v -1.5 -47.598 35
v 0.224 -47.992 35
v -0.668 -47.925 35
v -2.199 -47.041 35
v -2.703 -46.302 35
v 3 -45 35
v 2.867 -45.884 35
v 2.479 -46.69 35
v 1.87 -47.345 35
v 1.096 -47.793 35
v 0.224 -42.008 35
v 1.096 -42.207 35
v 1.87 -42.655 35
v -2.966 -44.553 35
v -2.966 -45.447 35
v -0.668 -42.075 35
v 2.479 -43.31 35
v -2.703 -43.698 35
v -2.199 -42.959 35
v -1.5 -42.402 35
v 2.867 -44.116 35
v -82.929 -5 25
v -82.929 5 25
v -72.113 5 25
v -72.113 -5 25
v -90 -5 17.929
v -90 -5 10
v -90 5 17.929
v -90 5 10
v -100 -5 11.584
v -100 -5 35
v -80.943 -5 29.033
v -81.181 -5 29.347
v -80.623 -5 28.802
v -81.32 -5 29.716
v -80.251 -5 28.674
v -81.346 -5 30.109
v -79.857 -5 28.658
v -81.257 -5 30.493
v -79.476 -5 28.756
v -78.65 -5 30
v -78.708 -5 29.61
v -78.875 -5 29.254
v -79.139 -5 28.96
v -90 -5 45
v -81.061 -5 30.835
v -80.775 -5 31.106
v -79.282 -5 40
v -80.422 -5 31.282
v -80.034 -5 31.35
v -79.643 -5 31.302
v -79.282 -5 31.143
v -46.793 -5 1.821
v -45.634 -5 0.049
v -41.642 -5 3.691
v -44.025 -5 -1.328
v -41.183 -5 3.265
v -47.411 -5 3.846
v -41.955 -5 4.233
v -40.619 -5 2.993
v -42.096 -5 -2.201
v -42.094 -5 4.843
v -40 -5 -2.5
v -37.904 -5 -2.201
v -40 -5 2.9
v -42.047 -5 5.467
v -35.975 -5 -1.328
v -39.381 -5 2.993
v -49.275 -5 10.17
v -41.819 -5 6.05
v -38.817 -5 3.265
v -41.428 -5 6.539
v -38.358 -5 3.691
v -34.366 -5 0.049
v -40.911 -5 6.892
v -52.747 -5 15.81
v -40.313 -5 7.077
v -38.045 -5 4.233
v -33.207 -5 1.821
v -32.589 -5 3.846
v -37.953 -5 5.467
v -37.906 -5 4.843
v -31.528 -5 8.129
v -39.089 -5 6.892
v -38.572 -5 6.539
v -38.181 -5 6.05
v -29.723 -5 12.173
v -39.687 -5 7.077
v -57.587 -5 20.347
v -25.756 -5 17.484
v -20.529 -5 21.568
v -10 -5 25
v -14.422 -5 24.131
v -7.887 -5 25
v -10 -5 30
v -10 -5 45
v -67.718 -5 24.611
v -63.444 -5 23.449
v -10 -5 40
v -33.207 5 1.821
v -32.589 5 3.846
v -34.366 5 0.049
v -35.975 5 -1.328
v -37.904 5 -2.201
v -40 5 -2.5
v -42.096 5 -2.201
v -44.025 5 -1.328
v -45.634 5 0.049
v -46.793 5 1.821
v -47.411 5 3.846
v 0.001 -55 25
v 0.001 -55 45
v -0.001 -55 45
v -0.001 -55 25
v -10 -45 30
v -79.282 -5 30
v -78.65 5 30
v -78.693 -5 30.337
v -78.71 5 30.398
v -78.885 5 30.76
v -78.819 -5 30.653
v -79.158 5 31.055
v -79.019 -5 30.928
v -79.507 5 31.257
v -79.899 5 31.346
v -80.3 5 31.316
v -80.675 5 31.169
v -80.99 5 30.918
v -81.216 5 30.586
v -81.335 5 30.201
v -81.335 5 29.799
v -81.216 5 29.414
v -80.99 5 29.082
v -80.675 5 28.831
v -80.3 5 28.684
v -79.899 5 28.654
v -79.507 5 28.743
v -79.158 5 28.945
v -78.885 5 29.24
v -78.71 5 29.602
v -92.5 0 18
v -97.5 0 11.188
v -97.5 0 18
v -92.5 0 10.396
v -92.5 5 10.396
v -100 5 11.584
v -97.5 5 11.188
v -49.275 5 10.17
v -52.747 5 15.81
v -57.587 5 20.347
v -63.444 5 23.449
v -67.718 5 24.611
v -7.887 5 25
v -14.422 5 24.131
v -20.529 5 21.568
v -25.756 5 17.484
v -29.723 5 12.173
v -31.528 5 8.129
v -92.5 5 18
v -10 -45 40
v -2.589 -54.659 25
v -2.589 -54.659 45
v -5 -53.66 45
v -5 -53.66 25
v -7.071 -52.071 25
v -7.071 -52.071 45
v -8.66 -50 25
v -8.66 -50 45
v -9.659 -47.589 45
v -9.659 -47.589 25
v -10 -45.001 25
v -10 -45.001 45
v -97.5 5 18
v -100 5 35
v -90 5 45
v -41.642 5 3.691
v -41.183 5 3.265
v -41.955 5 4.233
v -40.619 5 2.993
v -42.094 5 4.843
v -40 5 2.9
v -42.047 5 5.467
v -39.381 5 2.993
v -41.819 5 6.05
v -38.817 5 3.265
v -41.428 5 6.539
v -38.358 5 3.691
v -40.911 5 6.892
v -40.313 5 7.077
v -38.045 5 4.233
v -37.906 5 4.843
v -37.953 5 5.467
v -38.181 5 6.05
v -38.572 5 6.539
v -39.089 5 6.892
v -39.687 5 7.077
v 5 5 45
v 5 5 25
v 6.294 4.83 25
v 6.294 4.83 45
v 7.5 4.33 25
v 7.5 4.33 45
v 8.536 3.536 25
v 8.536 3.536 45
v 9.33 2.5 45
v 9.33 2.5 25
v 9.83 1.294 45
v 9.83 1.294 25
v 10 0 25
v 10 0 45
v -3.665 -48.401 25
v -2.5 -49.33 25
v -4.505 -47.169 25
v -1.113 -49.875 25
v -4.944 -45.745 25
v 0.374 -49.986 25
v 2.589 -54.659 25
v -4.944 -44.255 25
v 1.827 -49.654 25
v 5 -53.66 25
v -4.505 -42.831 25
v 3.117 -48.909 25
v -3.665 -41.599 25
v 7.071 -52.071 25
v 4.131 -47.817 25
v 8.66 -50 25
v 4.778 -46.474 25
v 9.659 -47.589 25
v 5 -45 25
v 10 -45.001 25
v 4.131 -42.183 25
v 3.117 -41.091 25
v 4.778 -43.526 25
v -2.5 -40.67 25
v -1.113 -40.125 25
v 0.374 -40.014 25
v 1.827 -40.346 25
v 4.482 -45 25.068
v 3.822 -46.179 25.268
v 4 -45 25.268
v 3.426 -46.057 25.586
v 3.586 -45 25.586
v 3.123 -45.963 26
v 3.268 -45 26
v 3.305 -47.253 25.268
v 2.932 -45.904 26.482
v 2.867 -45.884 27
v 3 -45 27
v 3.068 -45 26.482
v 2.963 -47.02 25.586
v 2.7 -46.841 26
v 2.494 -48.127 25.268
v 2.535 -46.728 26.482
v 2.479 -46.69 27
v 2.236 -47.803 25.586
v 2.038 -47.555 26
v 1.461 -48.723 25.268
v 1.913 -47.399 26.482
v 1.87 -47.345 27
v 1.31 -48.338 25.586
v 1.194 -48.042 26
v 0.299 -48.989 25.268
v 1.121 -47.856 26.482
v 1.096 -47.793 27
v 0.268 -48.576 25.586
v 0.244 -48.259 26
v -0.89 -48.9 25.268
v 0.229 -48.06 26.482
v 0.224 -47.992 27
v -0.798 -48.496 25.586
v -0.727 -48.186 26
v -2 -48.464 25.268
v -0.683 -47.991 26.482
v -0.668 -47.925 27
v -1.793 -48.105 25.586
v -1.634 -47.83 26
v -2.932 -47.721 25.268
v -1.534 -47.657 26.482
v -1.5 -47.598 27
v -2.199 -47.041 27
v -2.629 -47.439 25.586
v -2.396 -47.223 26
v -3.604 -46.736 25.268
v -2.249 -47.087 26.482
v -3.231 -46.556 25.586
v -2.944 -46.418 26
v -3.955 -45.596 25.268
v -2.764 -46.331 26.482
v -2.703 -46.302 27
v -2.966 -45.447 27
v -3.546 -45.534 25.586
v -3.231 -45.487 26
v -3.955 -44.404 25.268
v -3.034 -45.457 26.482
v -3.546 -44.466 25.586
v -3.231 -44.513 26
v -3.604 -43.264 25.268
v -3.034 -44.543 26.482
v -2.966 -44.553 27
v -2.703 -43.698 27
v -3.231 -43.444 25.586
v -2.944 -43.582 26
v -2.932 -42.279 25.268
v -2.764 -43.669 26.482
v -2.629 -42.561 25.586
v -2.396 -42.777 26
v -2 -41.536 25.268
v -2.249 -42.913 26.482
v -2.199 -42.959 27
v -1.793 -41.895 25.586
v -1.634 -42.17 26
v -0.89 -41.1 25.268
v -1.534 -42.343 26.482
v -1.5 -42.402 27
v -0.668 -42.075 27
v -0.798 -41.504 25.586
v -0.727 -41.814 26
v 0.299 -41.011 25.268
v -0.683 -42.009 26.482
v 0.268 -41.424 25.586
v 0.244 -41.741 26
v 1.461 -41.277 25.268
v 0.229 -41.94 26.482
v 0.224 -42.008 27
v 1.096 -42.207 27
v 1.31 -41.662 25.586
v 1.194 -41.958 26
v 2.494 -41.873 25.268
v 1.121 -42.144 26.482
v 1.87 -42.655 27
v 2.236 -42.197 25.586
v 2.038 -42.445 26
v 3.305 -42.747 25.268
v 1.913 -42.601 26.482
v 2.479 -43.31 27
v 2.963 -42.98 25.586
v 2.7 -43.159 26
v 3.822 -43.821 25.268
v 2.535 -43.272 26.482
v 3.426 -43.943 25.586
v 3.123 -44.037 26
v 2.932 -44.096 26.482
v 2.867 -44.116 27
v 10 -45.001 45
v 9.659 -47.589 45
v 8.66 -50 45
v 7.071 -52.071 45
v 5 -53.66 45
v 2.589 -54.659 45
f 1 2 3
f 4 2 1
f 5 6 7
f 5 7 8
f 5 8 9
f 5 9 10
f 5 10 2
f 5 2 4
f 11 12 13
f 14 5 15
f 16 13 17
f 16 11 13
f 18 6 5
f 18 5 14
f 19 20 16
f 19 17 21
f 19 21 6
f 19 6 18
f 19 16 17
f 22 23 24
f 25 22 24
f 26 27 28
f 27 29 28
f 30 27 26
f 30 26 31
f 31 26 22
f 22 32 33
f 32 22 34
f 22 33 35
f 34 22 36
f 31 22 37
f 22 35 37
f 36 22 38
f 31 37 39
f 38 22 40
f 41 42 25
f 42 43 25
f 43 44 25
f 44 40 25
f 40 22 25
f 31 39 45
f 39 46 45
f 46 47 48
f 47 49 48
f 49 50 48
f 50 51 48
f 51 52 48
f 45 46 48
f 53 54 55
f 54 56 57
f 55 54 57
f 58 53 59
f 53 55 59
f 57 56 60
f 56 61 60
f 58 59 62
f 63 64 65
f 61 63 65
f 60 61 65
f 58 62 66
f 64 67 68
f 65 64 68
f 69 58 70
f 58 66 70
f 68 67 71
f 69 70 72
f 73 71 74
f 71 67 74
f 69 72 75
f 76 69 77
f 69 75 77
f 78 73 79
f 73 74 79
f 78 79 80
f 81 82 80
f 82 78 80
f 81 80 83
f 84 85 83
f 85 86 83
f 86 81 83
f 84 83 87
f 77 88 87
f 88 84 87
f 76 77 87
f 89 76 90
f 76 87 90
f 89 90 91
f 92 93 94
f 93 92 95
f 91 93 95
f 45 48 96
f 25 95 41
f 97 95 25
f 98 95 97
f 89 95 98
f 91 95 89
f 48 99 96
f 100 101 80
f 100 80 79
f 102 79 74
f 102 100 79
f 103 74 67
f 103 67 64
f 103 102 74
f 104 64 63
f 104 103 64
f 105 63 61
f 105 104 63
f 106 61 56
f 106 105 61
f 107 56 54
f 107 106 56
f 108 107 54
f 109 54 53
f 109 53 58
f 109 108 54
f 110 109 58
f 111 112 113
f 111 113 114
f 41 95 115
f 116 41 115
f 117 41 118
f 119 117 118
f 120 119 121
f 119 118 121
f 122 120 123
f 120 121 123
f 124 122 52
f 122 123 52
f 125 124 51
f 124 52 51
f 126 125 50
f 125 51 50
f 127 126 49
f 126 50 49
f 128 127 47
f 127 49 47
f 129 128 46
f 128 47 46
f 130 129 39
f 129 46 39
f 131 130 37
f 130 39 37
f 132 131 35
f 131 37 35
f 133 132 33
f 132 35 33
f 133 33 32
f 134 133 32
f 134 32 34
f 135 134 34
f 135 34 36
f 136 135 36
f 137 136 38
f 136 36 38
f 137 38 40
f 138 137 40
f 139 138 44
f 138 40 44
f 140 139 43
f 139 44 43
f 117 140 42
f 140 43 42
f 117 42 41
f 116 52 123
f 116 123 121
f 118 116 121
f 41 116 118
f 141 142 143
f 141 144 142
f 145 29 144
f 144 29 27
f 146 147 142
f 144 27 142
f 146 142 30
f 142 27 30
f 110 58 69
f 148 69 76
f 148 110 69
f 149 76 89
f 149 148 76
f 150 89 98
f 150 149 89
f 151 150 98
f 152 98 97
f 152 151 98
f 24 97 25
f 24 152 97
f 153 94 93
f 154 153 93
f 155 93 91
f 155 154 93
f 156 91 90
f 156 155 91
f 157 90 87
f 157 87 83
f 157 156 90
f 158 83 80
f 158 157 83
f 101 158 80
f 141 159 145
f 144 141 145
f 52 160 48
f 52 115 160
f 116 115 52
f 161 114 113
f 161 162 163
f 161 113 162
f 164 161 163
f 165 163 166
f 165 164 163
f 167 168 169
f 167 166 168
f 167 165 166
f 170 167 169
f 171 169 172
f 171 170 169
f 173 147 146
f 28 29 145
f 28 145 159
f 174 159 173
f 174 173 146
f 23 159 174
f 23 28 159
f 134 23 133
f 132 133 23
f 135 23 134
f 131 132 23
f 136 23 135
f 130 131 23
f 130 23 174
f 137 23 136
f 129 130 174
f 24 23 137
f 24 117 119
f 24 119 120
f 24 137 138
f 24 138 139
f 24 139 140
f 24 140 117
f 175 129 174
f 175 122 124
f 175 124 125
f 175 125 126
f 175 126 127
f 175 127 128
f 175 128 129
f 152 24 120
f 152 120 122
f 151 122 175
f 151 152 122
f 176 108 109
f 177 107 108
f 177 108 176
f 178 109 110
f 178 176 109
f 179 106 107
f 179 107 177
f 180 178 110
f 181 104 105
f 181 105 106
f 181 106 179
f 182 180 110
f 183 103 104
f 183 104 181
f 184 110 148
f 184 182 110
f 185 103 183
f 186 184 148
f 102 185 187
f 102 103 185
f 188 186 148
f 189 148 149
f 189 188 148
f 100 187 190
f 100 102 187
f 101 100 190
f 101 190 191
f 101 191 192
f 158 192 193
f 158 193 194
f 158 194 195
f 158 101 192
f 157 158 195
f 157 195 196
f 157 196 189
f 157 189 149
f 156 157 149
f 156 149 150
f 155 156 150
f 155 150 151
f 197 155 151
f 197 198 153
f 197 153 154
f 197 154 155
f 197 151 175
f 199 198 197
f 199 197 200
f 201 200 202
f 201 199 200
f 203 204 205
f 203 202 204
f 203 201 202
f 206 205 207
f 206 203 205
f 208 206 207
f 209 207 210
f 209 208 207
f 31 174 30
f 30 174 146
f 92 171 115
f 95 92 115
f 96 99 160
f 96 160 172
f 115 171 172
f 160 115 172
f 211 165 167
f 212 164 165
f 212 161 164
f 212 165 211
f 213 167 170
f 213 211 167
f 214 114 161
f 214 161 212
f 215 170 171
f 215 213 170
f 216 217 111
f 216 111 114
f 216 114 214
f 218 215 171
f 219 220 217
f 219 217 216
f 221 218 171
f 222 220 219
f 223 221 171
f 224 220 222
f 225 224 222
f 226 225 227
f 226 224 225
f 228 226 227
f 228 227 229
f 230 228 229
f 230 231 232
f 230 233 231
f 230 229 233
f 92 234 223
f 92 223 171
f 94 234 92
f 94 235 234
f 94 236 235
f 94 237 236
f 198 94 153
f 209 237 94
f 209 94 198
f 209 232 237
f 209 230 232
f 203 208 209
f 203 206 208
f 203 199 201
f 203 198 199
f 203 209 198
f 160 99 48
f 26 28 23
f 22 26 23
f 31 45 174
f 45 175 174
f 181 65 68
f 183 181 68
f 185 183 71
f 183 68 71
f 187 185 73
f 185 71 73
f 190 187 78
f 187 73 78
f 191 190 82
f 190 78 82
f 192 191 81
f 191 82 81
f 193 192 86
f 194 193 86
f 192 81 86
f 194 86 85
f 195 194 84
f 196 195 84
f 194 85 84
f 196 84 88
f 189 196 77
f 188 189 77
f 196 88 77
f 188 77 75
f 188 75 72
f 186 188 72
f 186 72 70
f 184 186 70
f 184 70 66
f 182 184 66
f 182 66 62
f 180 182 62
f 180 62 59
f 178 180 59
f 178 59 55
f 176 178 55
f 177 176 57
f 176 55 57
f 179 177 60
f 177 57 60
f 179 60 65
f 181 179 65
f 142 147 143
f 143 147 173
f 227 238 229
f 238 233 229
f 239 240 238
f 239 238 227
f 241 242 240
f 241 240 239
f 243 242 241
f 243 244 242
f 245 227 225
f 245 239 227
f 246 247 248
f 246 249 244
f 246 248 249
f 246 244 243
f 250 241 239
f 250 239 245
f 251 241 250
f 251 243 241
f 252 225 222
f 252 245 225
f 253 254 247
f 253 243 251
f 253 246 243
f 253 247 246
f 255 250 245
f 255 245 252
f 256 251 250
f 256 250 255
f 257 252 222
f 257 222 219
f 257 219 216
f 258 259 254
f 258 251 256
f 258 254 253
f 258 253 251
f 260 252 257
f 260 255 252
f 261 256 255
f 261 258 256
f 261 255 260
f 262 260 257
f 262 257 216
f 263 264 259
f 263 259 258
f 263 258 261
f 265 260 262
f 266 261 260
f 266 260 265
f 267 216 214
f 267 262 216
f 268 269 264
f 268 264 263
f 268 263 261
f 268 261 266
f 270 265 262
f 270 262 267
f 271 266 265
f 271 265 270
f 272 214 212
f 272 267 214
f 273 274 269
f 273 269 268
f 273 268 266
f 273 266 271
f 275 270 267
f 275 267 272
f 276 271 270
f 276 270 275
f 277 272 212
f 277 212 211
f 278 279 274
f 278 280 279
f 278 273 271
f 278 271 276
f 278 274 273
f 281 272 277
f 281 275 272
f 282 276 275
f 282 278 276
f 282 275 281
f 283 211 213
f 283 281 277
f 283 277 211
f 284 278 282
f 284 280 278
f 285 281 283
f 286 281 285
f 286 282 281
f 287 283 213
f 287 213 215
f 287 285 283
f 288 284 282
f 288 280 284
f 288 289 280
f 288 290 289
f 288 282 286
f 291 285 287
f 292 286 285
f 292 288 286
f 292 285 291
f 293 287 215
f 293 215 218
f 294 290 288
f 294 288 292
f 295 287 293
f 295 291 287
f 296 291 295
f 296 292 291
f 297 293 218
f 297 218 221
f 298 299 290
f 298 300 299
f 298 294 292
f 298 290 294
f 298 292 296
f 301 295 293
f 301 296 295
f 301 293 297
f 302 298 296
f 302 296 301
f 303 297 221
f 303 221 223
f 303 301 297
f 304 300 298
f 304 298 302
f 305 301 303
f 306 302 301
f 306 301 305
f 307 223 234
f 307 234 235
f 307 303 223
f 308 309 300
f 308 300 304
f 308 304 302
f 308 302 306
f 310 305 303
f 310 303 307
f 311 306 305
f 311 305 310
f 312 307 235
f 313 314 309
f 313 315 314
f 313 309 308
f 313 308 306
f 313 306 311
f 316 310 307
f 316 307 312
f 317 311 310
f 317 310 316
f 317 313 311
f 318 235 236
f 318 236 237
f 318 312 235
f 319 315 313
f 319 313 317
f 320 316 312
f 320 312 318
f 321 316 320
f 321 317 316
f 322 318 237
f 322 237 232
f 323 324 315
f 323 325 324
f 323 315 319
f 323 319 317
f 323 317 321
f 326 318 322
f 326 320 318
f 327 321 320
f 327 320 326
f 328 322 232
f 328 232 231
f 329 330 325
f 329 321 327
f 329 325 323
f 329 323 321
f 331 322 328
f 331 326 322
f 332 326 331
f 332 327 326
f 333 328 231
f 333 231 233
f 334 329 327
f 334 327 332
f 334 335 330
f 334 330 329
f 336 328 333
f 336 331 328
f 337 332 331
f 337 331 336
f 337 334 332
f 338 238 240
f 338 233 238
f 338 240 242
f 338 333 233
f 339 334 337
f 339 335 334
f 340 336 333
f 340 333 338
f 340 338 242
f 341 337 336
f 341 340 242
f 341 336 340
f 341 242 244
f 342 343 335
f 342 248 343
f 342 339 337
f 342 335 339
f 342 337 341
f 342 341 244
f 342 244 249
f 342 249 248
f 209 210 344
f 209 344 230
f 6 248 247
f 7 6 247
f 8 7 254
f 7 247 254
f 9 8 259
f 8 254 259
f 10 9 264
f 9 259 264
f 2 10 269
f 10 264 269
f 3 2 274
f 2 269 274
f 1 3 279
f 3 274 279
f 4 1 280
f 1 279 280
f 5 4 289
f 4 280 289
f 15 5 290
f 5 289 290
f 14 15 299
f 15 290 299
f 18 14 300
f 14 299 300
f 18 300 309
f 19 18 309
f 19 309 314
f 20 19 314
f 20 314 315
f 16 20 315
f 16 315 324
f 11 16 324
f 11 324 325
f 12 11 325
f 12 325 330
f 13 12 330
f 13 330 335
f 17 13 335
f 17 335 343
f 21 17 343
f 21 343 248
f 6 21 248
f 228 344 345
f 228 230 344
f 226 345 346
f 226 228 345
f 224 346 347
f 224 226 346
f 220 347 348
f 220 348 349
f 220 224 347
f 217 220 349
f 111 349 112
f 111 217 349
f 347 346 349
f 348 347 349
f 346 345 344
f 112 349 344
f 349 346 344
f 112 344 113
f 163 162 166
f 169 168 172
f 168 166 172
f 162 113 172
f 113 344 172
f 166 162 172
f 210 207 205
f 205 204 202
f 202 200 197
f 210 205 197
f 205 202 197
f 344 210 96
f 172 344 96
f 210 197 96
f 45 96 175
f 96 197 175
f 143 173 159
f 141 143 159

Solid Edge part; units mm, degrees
sketch "Sketch1" plane through (0, 0, 0) normal (0, -1, 0) x (1, 0, 0)
  line L0 (10, 45) -> (10, 25)
  line L1 (-32.5, 25) -> (10, 25)
  line L2 (-32.5, 5) -> (-32.5, 25)
  arc A0 (-32.5, 5) -> (-47.5, 5) centre (-40, 5) cw
  line L3 (-47.5, 25) -> (-47.5, 5)
  line L4 (-82.9289, 25) -> (-47.5, 25)
  line L5 (-90, 17.9289) -> (-82.9289, 25)
  line L6 (-90, 10) -> (-90, 17.9289)
  line L7 (-100, 10) -> (-90, 10)
  line L8 (-100, 35) -> (-100, 10)
  line L9 (-90, 45) -> (-100, 35)
  line L10 (10, 45) -> (-90, 45)
  dimension "D1" = 10
  dimension "D2" = 10
  dimension "D3" = 10
  dimension "D4" = 100
  dimension "D5" = 15
  dimension "D6" = 5
  dimension "D7" = 10
  dimension "D8" = 10
  dimension "D9" = 40
extrude "Protrusion1" add sketch "Sketch1" along normal mid plane 10
sketch "Sketch2" plane through (0, 0, 0) normal (0, -1, 0) x (1, 0, 0)
  circle A0 centre (-80, 30) radius 1.35
  dimension "D1" = 30
  dimension "D2" = 80
extrude "ExtrudedCutout_3" cut sketch "Sketch2" along normal mid plane 29.2691
hole "Hole_1" at (-40, -5, 5) direction (0, 1, 0) diameter 4.2 end up to next
fillet "Round_7" radius 25 2 edges at (-47.5, 0, 25) (-32.5, 0, 25)
sketch "Sketch3" plane through (10, 0, 30) normal (1, 0, 0) x (0, 1, 0)
  line L0 (5, 15) -> (-55, 15)
  line L1 (-55, 15) -> (-55, -5)
  line L2 (-55, -5) -> (5, -5)
  line L3 (5, -5) -> (5, 15)
  dimension "D1" = 60
extrude "ExtrudedProtrusion_3" add sketch "Sketch3" against normal blind 20
fillet "Round_8" radius 10 2 edges at (-10, -55, 35) (10, -55, 35)
fillet "Round_9" radius 5 1 edges at (10, 5, 35)
sketch "Sketch4" plane through (-50, 5, 17.5) normal (0, 1, 0) x (1, 0, 0)
  line L0 (-47.5, 7.5) -> (-47.5, -0.5)
  line L1 (-47.5, -0.5) -> (-42.5, -0.5)
  line L2 (-42.5, -0.5) -> (-42.5, 7.5)
  line L3 (-42.5, 7.5) -> (-47.5, 7.5)
  dimension "D1" = 5
  dimension "D2" = 8
extrude "ExtrudedCutout_5" cut sketch "Sketch4" against normal blind 5
sketch "Sketch5" plane through (-65, -5, 17.5) normal (0, -1, 0) x (1, 0, 0)
  line L0 (-25, -7.5) -> (-35, -5.9162)
  line L1 (-35, -5.9162) -> (-35, -7.5)
  line L2 (-35, -7.5) -> (-25, -7.5)
extrude "ExtrudedCutout_6" cut sketch "Sketch5" against normal blind 31.7921
sketch "Sketch6" plane through (-8.75, -25, 25) normal (0, 0, -1) x (1, 0, 0)
  circle A0 centre (8.75, 20) radius 3
  dimension "D1" = 6
extrude "ExtrudedCutout_7" cut sketch "Sketch6" against normal blind 10
fillet "Round_11" radius 2 1 edges at (-3, -45, 25)
sketch "Sketch7" plane through (-40, -25, 35) normal (0, 0, 1) x (-1, 0, 0)
  line L0 (-30, 20) -> (39.282, -20)
  line L1 (39.282, -20) -> (-30, -20)
  line L2 (-30, -20) -> (-30, 20)
extrude "ExtrudedProtrusion_4" add sketch "Sketch7" along normal mid plane 10
properties material "PPA-CF"
